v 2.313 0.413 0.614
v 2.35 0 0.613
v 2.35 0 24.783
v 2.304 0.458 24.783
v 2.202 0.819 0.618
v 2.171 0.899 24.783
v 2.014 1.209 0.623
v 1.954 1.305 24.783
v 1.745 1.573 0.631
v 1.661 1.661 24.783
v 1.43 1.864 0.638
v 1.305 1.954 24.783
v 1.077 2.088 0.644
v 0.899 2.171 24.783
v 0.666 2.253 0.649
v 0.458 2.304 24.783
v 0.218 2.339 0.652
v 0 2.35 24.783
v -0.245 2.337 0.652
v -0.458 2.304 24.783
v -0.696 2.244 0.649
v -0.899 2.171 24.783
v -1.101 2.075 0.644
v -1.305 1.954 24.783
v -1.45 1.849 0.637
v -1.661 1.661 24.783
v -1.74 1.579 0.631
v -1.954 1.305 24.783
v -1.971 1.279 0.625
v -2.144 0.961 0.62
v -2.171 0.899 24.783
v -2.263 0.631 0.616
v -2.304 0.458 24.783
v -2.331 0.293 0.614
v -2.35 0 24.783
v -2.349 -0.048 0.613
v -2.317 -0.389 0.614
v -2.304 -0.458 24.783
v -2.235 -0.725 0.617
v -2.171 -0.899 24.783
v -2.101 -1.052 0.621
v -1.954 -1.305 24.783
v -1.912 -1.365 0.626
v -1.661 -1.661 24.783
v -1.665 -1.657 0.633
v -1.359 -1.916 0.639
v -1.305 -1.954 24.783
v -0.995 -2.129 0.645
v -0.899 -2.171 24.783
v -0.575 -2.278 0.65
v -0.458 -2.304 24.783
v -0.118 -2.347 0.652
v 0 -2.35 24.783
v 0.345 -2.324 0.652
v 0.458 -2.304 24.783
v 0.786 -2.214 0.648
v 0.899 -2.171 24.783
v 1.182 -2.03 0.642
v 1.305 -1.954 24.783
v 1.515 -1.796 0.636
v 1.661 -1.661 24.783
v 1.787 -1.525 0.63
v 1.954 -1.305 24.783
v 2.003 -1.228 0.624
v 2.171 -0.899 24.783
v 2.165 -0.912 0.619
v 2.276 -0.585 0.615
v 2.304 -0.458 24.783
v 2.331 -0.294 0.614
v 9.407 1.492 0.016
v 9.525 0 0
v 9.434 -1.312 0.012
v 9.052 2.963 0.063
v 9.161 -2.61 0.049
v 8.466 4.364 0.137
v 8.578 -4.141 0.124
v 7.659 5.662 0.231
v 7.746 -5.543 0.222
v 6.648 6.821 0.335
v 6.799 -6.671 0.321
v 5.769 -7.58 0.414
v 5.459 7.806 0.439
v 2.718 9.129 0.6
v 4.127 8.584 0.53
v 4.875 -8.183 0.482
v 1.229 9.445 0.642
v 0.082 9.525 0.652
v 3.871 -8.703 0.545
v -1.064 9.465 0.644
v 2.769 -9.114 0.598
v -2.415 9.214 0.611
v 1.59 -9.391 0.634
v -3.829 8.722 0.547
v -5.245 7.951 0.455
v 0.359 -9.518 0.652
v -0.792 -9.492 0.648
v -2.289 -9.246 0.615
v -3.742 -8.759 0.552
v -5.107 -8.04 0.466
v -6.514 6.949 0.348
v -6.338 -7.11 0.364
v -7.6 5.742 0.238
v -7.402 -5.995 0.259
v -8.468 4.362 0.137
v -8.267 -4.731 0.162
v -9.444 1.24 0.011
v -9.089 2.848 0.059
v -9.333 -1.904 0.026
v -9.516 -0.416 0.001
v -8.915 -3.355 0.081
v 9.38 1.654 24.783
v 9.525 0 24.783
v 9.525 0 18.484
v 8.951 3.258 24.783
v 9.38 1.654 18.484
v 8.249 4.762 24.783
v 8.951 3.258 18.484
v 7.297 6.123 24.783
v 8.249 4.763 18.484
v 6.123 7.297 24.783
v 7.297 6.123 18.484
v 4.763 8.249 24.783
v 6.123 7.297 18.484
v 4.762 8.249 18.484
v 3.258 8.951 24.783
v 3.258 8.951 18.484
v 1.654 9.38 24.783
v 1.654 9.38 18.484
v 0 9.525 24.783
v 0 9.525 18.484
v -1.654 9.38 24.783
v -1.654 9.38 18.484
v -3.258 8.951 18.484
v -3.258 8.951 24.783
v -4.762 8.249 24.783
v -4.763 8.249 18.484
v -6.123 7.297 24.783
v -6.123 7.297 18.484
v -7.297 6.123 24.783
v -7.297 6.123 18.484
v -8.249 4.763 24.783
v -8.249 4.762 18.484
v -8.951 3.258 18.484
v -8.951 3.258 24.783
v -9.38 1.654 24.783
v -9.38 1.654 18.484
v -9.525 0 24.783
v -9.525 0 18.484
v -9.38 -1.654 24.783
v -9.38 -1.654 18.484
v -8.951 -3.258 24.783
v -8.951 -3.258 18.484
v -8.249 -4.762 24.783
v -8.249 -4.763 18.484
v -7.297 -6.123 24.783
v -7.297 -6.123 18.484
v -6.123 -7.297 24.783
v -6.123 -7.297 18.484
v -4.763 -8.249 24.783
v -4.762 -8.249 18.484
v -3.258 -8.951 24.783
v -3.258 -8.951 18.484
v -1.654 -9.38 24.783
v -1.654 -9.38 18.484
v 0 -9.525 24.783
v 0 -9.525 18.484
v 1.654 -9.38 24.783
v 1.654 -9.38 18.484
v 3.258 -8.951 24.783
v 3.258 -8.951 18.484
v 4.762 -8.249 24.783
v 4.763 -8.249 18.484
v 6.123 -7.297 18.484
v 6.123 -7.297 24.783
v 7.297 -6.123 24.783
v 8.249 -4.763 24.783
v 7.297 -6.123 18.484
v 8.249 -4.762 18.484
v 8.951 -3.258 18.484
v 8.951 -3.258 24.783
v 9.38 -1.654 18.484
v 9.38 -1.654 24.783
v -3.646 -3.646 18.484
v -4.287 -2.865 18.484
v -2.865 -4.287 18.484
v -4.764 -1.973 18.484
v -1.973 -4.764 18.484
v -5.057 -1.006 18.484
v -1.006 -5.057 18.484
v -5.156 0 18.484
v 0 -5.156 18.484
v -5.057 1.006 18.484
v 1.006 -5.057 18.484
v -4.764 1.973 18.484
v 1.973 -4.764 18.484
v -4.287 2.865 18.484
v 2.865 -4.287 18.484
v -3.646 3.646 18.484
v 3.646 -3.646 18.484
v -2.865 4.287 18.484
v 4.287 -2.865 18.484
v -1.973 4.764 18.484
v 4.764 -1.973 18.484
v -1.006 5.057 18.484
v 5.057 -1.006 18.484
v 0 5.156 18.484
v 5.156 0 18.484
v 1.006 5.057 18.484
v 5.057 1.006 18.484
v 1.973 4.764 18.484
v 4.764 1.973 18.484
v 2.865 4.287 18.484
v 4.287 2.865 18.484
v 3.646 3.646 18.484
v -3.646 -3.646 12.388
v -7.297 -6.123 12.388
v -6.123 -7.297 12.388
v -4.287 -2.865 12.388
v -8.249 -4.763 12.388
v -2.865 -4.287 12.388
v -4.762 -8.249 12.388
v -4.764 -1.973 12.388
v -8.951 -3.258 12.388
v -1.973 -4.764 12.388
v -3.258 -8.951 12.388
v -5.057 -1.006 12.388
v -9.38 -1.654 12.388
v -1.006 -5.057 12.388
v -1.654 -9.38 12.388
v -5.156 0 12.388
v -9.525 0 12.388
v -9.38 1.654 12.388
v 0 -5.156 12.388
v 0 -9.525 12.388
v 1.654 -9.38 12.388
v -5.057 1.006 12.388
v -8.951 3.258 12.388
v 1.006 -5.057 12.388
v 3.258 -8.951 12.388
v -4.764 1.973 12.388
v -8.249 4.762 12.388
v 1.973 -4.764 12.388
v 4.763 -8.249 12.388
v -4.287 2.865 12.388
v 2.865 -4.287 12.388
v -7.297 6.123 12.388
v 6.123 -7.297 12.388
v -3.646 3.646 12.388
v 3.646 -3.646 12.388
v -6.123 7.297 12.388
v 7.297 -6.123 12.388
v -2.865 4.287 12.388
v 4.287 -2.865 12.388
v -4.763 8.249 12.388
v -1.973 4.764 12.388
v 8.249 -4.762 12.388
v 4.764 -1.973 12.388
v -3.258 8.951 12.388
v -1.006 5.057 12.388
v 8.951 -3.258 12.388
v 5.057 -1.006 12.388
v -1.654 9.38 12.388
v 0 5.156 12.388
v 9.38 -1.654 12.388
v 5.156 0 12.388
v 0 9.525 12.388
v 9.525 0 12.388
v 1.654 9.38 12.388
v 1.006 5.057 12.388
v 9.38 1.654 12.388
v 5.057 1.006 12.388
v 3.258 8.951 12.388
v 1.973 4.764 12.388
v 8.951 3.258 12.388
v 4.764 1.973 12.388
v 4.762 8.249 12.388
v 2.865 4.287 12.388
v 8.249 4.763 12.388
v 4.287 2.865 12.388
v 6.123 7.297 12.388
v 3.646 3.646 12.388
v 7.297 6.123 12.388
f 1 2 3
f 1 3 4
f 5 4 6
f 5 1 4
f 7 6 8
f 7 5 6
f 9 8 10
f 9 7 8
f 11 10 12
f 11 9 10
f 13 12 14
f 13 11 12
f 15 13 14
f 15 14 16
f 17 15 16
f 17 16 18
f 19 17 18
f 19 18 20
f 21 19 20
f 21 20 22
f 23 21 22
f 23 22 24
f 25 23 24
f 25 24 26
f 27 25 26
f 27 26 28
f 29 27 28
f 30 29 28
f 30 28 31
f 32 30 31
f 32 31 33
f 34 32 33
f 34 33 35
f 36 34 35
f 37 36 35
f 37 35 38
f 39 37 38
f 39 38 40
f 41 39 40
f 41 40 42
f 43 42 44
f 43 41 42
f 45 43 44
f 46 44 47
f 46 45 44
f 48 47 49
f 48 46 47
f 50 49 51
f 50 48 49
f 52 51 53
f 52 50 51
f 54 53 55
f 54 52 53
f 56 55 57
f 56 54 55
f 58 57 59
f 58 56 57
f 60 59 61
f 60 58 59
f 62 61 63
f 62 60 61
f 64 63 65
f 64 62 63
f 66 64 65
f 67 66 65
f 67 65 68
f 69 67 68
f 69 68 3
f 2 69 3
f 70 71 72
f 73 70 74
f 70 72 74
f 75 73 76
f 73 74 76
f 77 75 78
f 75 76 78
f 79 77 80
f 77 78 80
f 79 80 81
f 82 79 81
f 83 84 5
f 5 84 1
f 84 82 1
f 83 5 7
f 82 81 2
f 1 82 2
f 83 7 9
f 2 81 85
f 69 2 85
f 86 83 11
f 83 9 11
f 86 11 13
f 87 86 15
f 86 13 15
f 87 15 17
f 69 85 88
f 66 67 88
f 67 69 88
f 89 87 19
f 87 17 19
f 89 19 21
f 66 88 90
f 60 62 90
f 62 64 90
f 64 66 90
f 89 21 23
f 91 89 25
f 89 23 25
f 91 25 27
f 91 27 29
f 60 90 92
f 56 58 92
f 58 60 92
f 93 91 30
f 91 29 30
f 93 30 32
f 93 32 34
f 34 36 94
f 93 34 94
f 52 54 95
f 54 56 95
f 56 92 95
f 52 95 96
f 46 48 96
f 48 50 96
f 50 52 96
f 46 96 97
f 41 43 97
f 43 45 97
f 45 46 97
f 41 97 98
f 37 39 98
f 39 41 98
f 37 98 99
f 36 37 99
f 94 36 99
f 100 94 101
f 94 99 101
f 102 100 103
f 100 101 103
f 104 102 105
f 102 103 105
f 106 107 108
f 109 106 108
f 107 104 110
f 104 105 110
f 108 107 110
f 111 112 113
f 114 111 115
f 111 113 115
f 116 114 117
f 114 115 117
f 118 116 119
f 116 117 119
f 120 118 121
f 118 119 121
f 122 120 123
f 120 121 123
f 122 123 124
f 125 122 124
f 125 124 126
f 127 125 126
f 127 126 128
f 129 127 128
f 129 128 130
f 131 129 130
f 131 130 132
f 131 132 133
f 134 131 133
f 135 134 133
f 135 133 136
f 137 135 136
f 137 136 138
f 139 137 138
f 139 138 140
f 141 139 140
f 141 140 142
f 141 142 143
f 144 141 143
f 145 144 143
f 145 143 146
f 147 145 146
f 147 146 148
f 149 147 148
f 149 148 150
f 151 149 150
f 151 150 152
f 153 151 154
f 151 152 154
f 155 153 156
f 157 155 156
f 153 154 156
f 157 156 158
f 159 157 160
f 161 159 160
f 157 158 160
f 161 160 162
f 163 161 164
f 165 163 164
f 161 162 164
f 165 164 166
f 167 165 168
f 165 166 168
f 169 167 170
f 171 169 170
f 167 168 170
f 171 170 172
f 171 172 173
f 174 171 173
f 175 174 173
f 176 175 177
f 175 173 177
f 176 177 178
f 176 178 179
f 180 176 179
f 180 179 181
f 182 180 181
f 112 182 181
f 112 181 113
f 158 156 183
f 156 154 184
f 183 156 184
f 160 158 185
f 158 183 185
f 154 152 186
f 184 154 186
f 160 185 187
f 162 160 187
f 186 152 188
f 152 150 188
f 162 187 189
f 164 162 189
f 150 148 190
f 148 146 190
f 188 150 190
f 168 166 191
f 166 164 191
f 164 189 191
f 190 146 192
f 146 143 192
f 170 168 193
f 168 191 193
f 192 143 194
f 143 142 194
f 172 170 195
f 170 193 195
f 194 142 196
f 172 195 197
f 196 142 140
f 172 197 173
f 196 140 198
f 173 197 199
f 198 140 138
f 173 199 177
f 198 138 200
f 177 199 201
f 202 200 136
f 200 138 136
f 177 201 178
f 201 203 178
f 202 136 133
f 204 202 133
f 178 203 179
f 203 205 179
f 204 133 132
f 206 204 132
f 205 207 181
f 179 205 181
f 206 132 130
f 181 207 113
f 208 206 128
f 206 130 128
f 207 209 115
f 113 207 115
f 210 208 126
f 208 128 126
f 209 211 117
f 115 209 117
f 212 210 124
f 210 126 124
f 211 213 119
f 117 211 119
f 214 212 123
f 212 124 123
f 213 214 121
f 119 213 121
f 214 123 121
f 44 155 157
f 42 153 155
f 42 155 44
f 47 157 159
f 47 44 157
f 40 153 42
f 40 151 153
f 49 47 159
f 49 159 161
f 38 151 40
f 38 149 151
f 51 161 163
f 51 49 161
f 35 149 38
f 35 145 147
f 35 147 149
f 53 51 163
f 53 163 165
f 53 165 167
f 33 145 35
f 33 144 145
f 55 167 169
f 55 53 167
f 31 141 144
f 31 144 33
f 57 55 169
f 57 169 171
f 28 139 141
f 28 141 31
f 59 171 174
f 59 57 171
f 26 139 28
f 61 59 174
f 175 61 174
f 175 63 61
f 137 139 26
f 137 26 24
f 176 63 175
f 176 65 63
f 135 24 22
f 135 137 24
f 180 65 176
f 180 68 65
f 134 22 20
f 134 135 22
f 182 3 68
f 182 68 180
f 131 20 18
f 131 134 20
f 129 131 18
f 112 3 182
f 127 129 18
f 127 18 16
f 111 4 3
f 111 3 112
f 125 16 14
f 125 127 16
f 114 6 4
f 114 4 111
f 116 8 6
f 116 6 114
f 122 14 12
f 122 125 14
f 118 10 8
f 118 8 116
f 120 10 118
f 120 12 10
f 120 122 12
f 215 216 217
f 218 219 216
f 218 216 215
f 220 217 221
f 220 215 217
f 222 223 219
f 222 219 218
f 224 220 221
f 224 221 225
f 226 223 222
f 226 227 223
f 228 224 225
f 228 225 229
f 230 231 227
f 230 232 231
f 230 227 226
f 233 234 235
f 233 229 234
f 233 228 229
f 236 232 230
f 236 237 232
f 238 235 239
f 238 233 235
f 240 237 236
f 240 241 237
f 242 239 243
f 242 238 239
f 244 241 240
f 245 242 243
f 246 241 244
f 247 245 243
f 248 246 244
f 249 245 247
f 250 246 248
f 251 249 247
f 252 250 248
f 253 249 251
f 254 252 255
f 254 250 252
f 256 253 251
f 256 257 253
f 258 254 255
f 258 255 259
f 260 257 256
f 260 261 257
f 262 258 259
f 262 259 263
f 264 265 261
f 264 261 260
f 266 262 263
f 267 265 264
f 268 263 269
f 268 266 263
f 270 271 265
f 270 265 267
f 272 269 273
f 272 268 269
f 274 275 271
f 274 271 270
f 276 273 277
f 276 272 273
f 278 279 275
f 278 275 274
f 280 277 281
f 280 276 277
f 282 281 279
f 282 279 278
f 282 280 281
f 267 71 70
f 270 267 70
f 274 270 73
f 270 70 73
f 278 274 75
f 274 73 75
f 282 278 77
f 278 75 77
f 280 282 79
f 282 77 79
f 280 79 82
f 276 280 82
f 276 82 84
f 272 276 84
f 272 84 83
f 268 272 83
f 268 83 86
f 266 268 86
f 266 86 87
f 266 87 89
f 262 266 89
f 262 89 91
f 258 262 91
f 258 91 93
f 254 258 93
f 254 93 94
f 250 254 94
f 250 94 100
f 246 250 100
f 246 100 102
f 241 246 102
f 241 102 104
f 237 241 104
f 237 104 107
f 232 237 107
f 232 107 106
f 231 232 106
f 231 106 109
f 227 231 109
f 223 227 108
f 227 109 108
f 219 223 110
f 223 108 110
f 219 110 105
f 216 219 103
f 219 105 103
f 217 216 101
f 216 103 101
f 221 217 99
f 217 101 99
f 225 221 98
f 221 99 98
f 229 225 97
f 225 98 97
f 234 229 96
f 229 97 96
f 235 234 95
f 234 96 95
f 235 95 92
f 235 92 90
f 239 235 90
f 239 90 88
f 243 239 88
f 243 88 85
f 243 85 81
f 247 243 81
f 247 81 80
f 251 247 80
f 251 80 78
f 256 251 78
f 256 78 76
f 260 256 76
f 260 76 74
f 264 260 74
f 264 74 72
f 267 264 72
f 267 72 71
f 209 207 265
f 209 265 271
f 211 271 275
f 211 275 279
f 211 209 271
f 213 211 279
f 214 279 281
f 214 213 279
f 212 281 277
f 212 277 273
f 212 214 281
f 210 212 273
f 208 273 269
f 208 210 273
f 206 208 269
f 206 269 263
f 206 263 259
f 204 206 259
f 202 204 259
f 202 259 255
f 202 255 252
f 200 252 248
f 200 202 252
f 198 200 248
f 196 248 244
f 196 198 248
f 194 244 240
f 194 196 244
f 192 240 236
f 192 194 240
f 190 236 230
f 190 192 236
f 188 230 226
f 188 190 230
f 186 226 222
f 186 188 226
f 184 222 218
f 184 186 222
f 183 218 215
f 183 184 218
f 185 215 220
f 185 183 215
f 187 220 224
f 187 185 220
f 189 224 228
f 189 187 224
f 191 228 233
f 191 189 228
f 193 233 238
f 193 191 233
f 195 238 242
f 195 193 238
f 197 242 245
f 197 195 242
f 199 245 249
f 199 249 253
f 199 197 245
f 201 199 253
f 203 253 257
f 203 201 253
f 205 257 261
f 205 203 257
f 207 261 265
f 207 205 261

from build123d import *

# Parameters (mm, degrees)
SKETCH1_R           = 9.525
SKETCH1_R_2         = 2.3495
EXTRUDE1_DEPTH      = 24.78278
SKETCH2_OUTSIDE_W   = 28.372
SKETCH2_OUTSIDE_H   = 28.372
SKETCH2_OUTSIDE_R   = 5.1562
EXTRUDE2_DEPTH      = 6.096
EXTRUDE3_DEPTH      = 29.207045831
EXTRUDE3_DEPTH_BACK = 29.207045831


with BuildPart() as part:
    # Sketch1 → Extrude1 (new body)
    with BuildSketch(Plane.XY):
        Circle(SKETCH1_R)
        Circle(SKETCH1_R_2, mode=Mode.SUBTRACT)
    extrude(amount=EXTRUDE1_DEPTH)

    # Sketch2 outside → Extrude2 (cut)
    with BuildSketch(Plane.XY.offset(18.48358)):
        Rectangle(SKETCH2_OUTSIDE_W, SKETCH2_OUTSIDE_H)
        Circle(SKETCH2_OUTSIDE_R, mode=Mode.SUBTRACT)
    extrude(amount=-EXTRUDE2_DEPTH, mode=Mode.SUBTRACT)

    # Sketch3 → Extrude3 (cut, two sides: drawn at the far end of the back side and taken through both)
    with BuildSketch(Plane(origin=(0, 0, 0), x_dir=(1, 0, 0), z_dir=(0, 1, 0)).offset(-EXTRUDE3_DEPTH_BACK)):
        with BuildLine():
            Line((81.364445057, 9.888659405), (9.525, 0))
            ThreePointArc((9.525, 0), (0, -0.652479271), (-9.525, 0))
            Line((-9.525, 0), (-81.364445057, 9.888659405))
            Line((-81.364445057, 9.888659405), (-81.364445057, 154.92233068))
            Line((-81.364445057, 154.92233068), (81.364445057, 154.92233068))
            Line((81.364445057, 154.92233068), (81.364445057, 9.888659405))
        make_face()
    extrude(amount=EXTRUDE3_DEPTH + EXTRUDE3_DEPTH_BACK, mode=Mode.SUBTRACT)


solid = part.part
